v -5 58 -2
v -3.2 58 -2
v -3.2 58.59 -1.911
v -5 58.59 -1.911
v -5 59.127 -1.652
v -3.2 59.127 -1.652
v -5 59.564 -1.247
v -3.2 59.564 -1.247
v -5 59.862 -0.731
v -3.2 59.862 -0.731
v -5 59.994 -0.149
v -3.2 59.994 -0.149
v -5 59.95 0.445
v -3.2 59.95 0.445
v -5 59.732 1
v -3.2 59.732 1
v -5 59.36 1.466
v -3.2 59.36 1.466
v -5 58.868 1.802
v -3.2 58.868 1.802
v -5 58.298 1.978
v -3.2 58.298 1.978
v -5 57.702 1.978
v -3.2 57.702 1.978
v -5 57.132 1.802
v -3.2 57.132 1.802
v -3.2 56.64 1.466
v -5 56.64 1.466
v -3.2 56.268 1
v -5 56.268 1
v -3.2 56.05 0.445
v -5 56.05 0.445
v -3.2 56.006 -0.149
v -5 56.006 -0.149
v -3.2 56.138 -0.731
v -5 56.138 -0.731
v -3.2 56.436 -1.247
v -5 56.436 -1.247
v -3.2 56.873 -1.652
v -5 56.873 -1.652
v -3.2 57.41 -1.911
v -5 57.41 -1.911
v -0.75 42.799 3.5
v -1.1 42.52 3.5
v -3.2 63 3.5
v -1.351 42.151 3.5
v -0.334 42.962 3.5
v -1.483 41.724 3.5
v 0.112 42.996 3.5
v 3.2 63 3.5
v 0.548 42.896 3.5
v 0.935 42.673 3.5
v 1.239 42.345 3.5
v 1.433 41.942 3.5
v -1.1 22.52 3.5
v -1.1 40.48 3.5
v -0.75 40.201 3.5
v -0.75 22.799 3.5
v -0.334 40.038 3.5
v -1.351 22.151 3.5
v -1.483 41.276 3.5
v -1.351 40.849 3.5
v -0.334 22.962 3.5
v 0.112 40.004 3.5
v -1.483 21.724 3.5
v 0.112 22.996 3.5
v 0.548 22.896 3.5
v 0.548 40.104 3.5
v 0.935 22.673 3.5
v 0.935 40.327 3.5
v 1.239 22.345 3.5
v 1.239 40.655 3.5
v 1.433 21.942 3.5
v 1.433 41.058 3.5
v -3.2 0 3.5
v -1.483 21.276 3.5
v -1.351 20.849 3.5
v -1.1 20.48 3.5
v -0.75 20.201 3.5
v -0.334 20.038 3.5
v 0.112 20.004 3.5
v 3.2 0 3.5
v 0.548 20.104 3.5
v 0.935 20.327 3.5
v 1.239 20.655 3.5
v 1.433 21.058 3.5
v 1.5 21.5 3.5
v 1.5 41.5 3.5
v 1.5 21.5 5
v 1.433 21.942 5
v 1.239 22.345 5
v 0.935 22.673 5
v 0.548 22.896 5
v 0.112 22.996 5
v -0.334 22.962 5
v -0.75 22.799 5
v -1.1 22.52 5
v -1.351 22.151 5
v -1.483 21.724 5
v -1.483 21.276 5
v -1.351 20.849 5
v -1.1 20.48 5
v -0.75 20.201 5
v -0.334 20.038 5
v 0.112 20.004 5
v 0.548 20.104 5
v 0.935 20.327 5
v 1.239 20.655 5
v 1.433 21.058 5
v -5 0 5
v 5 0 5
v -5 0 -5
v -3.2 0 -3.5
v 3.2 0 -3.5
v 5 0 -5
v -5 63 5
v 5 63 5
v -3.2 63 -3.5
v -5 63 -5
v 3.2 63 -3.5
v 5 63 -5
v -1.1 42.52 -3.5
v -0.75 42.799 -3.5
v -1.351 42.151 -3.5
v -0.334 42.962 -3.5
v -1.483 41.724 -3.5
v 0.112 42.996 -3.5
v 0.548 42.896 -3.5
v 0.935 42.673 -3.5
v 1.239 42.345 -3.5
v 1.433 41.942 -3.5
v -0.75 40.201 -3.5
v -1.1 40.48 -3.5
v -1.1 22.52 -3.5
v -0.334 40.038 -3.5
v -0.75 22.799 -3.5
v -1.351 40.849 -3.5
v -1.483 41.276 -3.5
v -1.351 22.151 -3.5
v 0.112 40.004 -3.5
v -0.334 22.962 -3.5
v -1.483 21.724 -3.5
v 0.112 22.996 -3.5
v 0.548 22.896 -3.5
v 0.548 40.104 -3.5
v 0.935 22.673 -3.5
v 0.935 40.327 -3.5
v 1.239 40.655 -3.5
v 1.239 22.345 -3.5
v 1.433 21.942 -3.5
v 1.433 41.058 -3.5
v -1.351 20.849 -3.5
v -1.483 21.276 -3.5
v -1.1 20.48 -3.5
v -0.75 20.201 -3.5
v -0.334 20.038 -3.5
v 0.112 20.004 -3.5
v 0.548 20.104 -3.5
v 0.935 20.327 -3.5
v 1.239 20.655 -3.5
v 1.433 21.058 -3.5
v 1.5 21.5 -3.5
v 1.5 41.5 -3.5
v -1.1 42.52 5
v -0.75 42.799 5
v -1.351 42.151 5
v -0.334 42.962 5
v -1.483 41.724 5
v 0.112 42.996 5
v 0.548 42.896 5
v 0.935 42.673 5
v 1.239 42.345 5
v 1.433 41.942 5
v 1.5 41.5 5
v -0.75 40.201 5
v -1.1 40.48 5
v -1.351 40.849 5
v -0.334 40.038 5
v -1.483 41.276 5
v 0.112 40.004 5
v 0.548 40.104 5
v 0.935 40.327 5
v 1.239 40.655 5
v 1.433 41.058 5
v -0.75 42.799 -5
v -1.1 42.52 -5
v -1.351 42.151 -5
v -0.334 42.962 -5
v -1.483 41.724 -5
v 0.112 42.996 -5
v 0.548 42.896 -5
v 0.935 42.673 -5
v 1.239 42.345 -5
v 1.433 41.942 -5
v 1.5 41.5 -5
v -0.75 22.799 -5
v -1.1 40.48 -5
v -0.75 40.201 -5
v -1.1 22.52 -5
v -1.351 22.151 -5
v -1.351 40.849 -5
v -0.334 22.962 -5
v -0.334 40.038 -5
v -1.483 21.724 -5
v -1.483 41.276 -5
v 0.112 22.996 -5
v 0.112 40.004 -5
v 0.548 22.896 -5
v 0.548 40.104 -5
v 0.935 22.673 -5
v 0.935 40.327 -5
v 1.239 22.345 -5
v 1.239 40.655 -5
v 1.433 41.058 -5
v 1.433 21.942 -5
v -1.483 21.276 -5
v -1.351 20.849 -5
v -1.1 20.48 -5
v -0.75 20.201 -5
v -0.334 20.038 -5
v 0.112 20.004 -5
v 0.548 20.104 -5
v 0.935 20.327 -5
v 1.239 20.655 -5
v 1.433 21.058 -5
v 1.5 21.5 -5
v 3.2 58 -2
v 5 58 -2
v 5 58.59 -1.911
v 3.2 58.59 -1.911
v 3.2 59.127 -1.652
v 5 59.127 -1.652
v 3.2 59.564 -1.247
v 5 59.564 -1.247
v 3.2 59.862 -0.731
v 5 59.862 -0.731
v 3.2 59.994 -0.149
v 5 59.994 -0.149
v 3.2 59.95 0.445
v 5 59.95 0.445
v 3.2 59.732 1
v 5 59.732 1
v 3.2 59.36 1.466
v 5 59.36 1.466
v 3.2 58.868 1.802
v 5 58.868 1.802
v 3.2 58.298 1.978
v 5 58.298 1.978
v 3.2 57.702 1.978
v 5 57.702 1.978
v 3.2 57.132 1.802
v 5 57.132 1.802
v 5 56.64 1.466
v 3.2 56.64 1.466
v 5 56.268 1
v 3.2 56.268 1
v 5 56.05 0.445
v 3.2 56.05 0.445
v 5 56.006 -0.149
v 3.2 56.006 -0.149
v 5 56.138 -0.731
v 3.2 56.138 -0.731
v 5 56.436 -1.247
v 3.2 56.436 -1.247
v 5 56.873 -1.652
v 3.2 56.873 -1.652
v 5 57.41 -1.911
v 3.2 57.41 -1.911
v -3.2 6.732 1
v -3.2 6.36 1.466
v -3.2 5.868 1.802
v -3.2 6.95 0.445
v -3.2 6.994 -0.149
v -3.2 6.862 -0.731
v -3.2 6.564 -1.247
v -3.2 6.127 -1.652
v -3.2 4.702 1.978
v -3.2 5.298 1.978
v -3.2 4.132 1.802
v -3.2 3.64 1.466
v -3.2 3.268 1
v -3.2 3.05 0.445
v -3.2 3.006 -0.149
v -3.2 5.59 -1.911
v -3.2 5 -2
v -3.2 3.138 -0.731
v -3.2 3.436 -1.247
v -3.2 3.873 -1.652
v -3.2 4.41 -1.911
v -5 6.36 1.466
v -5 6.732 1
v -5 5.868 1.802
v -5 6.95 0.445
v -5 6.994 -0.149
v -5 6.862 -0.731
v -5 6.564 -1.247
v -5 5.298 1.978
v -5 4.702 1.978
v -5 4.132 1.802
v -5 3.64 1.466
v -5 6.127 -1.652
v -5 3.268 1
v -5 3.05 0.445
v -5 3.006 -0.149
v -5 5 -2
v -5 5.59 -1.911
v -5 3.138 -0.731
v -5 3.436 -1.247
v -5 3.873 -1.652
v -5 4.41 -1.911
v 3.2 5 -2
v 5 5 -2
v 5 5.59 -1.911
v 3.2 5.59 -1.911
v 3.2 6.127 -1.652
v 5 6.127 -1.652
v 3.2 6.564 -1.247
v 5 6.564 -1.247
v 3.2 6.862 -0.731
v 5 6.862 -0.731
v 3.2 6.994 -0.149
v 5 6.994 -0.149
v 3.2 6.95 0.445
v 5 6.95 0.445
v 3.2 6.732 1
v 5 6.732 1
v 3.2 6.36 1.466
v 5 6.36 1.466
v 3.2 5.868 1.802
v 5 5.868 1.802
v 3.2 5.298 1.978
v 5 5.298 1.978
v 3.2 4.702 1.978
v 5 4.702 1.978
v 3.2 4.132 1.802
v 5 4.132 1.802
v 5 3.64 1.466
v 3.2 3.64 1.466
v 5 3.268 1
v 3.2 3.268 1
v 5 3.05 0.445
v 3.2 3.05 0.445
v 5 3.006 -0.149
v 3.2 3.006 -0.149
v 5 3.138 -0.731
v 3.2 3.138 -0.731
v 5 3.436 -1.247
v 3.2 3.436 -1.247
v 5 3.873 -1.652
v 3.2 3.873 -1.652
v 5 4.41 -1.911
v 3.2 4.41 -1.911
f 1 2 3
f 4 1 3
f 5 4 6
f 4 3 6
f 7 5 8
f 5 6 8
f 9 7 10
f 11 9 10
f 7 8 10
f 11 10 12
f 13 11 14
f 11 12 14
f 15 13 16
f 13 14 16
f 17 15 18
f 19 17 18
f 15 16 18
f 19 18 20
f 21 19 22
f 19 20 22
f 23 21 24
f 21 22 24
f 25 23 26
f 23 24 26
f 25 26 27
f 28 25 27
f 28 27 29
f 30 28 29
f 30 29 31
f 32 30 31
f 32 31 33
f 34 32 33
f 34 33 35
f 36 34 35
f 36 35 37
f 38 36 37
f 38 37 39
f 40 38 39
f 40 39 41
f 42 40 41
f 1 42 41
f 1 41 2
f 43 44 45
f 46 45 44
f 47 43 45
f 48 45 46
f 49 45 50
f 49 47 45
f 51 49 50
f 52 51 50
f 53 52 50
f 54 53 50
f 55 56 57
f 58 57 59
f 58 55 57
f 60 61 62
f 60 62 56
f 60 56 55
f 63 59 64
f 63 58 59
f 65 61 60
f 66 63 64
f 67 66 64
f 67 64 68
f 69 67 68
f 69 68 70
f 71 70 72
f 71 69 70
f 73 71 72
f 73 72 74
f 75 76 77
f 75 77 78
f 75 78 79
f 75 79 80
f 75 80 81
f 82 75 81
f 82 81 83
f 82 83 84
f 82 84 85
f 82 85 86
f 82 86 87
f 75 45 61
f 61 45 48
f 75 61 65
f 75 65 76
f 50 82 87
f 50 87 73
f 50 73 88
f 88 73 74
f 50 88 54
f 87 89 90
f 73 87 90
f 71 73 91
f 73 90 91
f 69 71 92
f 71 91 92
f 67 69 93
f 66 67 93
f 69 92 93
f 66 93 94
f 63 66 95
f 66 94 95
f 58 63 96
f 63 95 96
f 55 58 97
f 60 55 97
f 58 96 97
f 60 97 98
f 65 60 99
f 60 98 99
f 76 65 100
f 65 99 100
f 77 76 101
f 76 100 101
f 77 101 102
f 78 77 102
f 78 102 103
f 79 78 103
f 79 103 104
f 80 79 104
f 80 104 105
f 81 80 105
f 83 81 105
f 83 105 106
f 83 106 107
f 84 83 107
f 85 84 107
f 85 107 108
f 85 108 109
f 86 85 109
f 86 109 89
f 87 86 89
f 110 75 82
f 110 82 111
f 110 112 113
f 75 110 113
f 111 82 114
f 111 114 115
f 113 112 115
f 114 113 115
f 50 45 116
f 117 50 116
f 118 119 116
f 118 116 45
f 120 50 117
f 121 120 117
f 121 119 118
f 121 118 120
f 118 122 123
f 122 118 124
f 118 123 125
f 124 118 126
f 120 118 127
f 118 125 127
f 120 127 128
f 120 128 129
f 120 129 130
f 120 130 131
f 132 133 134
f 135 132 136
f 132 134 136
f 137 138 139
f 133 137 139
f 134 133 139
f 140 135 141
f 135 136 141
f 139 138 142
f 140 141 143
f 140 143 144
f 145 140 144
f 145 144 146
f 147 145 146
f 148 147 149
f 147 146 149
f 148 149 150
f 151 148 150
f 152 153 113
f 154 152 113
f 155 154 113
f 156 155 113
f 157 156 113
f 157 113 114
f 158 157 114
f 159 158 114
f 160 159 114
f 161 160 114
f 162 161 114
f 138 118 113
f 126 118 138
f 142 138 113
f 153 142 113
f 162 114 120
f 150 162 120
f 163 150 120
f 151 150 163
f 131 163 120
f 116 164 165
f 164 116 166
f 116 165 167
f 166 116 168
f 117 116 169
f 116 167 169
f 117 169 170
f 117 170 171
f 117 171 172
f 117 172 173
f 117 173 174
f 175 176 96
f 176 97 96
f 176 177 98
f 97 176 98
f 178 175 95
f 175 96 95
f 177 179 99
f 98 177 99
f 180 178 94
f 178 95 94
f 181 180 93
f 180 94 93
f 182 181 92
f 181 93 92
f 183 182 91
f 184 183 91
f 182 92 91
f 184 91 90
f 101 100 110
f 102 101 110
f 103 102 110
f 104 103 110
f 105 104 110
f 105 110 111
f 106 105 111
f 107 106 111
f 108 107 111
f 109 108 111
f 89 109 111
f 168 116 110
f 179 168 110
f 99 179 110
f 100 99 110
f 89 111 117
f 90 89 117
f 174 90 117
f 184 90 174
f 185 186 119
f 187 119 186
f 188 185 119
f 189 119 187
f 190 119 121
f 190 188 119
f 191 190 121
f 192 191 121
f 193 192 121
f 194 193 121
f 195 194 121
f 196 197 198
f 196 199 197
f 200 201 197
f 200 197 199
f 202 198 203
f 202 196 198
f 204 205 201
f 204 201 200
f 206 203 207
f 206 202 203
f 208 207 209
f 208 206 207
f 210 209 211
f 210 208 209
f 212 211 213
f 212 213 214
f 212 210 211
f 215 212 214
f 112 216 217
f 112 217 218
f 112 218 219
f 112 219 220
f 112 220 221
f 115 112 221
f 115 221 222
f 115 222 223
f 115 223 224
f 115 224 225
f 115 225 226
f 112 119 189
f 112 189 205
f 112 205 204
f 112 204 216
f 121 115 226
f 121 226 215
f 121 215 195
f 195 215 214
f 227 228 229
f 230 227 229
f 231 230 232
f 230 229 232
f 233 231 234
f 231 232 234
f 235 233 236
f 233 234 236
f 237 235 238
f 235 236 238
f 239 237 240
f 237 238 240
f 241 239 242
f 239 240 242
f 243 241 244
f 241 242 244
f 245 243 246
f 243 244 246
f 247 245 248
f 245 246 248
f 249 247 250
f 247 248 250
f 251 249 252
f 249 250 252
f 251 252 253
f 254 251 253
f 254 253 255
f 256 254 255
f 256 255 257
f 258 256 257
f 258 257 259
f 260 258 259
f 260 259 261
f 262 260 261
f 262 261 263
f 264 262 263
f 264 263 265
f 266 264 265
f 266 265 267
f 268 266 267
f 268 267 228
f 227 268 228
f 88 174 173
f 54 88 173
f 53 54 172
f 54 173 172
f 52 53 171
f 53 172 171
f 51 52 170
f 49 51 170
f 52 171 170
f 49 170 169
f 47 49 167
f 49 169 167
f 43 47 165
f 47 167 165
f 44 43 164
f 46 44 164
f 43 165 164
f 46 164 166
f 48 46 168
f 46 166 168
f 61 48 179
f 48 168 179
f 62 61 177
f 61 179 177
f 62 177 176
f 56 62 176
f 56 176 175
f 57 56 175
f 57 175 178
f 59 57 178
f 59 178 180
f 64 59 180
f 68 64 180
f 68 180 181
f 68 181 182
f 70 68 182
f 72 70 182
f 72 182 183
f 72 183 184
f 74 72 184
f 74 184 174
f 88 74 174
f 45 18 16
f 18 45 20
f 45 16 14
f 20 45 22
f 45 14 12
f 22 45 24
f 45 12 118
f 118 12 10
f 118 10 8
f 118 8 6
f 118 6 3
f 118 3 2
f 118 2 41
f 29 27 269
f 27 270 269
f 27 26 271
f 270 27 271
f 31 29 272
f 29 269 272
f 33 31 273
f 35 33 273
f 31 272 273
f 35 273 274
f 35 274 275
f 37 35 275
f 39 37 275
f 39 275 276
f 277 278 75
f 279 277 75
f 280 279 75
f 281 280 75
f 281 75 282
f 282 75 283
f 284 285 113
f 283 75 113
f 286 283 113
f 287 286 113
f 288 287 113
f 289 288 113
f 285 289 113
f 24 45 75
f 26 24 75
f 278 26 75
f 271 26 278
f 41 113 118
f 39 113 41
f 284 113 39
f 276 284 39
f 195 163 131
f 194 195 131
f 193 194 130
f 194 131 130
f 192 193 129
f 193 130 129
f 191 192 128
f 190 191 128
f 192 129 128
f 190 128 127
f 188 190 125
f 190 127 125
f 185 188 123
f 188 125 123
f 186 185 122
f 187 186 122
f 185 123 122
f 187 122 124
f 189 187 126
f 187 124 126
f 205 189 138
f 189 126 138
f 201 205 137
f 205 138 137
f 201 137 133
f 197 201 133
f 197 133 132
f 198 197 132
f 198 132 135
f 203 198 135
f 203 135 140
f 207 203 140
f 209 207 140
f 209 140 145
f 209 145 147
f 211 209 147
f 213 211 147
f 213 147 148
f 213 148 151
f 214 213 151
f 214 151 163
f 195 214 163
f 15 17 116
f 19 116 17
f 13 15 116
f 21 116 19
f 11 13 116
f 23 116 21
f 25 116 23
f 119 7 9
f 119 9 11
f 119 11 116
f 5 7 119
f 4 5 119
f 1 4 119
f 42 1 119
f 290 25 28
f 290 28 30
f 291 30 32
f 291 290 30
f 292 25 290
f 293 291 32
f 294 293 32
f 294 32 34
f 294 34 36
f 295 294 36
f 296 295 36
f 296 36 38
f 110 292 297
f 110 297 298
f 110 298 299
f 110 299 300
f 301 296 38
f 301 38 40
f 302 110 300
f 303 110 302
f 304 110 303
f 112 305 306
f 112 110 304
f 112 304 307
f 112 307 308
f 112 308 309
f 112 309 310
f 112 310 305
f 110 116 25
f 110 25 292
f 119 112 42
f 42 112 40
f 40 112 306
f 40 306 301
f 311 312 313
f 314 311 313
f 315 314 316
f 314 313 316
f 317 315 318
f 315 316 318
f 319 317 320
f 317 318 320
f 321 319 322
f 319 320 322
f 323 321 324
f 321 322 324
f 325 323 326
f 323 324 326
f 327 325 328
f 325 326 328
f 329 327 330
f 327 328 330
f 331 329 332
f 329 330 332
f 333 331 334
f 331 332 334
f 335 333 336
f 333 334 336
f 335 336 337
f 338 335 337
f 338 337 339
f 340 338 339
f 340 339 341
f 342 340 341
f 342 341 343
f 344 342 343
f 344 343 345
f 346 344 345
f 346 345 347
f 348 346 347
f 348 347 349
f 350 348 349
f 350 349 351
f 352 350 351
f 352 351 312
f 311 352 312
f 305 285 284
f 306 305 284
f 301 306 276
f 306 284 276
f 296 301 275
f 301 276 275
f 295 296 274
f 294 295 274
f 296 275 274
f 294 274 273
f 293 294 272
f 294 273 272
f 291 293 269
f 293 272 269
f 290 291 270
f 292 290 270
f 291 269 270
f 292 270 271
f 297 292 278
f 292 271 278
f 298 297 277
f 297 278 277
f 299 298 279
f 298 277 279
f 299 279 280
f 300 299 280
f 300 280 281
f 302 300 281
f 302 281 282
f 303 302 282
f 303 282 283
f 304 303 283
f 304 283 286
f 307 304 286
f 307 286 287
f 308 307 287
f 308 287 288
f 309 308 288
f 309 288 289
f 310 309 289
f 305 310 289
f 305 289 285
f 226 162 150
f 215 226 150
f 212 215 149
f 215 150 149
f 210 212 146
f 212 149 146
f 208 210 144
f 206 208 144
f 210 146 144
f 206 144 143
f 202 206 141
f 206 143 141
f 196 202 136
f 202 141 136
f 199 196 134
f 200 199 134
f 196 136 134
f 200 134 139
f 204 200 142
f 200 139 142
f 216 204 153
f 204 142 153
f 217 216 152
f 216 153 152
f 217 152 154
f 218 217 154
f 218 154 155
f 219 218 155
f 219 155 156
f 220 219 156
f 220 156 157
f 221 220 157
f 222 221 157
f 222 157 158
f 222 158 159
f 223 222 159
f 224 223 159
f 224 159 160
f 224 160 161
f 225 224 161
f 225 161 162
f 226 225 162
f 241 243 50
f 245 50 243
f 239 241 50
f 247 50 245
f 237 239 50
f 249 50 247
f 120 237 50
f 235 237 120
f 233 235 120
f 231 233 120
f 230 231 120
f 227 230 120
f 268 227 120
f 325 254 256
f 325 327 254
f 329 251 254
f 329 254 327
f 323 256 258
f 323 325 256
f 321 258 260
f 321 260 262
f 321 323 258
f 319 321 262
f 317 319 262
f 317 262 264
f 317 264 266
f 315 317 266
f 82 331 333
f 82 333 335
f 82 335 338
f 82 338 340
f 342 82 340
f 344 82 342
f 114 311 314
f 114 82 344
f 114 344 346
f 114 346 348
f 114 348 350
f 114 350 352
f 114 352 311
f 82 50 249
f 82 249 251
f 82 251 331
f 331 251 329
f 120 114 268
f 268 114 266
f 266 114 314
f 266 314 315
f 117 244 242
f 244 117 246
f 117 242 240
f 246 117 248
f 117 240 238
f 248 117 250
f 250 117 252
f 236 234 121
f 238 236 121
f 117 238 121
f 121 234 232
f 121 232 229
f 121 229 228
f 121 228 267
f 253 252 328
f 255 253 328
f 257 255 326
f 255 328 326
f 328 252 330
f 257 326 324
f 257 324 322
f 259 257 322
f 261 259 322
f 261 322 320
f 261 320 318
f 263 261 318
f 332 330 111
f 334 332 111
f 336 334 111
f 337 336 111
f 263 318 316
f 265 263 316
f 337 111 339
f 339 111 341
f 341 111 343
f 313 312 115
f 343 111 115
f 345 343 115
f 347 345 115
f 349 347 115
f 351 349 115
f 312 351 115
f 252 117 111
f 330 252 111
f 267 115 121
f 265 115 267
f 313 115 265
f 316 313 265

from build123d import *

# Parameters (mm, degrees)
SKETCH_1_W          = 10
SKETCH_1_H          = 10
SKETCH_1_W_2        = 6.4
SKETCH_1_H_2        = 7
EXTRUDE_1_DEPTH     = 63
SKETCH_2_R          = 1.5
CUT_EXTRUDE_1_DEPTH = 30
SKETCH_3_R          = 2
CUT_EXTRUDE_2_DEPTH = 30


with BuildPart() as part:
    # 草图1 → 凸台-拉伸1 (new body)
    with BuildSketch(Plane(origin=(0, 0, 0), x_dir=(1, 0, 0), z_dir=(0, 1, 0))):
        Rectangle(SKETCH_1_W, SKETCH_1_H)
        Rectangle(SKETCH_1_W_2, SKETCH_1_H_2, mode=Mode.SUBTRACT)
    extrude(amount=EXTRUDE_1_DEPTH)

    # 草图2 → 切除-拉伸1 (cut)
    with BuildSketch(Plane.XY.offset(5)):
        with Locations((0, 41.5)):
            Circle(SKETCH_2_R)
        with Locations((0, 21.5)):
            Circle(SKETCH_2_R)
    extrude(amount=-CUT_EXTRUDE_1_DEPTH, mode=Mode.SUBTRACT)

    # 草图3 → 切除-拉伸2 (cut)
    with BuildSketch(Plane(origin=(5, 0, 0), x_dir=(0, 0, -1), z_dir=(1, 0, 0))):
        with Locations((0, 5)):
            Circle(SKETCH_3_R)
        with Locations((0, 58)):
            Circle(SKETCH_3_R)
    extrude(amount=-CUT_EXTRUDE_2_DEPTH, mode=Mode.SUBTRACT)


solid = part.part
